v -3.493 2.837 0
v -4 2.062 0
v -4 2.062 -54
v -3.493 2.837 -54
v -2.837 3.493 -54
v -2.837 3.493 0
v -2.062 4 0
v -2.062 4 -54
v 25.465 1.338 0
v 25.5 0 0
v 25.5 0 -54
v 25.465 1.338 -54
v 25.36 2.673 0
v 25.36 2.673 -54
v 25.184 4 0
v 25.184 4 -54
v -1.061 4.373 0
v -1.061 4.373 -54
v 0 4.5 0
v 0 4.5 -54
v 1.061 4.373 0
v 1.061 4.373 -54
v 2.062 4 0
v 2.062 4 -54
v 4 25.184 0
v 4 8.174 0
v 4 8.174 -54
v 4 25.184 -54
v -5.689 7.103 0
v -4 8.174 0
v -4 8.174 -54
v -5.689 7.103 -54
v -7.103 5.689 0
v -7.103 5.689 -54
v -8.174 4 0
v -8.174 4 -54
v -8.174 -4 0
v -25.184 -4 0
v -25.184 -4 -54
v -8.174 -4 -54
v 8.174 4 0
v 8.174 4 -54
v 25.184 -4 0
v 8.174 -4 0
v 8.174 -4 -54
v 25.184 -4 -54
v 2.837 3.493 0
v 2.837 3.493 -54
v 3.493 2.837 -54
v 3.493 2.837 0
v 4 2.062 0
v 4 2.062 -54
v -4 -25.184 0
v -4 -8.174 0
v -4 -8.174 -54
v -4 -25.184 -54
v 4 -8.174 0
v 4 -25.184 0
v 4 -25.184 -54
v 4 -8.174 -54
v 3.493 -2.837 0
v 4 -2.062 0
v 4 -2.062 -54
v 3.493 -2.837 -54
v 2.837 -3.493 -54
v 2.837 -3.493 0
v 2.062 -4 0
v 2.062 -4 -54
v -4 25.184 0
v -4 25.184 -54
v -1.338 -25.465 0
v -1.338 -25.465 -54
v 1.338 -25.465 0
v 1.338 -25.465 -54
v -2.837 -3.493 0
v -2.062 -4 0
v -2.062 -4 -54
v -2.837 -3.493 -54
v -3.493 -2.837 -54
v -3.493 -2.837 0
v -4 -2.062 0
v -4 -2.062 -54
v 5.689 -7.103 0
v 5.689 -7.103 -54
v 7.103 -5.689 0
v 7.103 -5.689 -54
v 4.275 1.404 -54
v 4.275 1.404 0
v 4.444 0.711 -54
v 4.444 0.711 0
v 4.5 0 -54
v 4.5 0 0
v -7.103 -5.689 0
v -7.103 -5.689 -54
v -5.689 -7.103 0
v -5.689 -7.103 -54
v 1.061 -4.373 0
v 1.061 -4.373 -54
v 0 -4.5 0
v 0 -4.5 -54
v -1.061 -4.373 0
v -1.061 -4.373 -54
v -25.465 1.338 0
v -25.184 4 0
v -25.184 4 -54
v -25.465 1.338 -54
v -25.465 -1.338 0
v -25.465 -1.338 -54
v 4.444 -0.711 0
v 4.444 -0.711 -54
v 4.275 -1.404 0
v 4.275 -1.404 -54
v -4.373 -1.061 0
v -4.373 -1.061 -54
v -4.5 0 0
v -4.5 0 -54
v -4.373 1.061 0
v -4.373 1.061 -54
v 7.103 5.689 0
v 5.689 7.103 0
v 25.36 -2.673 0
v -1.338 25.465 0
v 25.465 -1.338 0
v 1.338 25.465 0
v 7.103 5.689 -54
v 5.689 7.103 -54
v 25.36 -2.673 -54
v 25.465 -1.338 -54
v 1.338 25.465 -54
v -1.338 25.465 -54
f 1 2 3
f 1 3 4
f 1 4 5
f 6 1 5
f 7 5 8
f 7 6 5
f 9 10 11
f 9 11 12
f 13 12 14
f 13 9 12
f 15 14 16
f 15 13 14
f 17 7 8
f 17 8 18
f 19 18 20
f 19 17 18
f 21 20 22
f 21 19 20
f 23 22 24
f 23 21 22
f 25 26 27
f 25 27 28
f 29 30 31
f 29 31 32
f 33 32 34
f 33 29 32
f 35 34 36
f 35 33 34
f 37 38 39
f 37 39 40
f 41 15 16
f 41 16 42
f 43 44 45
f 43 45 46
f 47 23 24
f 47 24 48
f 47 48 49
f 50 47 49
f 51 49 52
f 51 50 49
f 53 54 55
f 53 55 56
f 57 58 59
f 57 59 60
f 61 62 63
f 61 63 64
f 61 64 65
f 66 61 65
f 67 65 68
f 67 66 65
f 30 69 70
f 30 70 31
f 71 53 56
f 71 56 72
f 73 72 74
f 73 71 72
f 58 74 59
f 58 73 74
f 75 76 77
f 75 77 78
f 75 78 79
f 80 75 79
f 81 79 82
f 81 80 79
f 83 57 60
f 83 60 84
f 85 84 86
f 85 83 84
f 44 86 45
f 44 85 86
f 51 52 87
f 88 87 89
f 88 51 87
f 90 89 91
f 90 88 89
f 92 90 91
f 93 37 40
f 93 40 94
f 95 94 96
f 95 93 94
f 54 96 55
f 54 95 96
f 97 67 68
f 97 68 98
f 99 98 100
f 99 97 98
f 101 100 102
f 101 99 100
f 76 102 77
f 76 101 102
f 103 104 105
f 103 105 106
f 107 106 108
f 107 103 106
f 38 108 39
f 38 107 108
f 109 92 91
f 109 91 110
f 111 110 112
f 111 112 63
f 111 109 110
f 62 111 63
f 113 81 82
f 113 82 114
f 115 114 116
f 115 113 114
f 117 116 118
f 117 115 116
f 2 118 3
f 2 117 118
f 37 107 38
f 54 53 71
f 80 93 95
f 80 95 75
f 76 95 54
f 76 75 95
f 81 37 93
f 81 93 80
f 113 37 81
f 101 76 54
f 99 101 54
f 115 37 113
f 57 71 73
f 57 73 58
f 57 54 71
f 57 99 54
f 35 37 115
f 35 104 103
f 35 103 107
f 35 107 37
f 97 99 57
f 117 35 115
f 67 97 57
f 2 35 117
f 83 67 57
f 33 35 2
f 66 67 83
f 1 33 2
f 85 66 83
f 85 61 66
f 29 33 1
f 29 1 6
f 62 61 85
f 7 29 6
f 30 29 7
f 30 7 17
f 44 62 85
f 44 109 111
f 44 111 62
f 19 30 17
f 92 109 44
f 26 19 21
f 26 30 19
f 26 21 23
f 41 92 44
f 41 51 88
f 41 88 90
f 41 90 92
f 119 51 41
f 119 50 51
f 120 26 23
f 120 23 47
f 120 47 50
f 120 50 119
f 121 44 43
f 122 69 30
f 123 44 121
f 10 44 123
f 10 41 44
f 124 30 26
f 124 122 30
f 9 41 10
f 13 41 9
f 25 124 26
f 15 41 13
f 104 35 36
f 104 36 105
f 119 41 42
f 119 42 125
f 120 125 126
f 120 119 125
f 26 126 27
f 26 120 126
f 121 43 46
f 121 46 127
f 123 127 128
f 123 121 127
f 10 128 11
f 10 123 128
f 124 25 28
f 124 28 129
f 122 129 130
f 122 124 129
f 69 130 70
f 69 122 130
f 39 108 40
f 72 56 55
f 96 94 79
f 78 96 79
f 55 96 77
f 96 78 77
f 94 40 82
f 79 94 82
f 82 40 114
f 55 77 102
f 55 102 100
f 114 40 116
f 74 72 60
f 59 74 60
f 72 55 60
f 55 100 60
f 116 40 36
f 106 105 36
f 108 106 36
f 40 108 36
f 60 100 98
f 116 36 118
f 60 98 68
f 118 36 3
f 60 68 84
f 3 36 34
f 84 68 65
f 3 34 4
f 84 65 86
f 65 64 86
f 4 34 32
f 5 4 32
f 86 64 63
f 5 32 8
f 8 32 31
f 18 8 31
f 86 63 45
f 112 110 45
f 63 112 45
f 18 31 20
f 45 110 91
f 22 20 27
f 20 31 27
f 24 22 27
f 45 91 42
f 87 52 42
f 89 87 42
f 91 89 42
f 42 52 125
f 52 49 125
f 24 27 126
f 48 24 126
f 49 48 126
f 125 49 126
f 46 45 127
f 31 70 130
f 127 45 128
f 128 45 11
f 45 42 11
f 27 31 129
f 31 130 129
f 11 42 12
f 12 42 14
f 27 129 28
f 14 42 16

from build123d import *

# Parameters (mm, degrees)
F1_DEPTH = 54


with BuildPart() as f1:
    # F0 (on Top) → F1 (new body)
    with BuildSketch(Plane.XY):
        with BuildLine():
            ThreePointArc((-4, 12.4743737318), (0, 13.1), (4, 12.4743737318))
            Line((4, 12.4743737318), (4, 25.1843205189))
            Line((4, 25.1843205189), (-4, 25.1843205189))
            Line((-4, 25.1843205189), (-4, 12.4743737318))
        make_face()
        with BuildLine():
            Line((-4, 25.1843205189), (4, 25.1843205189))
            ThreePointArc((4, 25.1843205189), (0, 25.5), (-4, 25.1843205189))
        make_face()
        with BuildLine():
            ThreePointArc((25.5, 0), (25.4209576259, 2.0062186779), (25.1843205189, 4))
            Line((25.1843205189, 4), (25.1843205189, -4))
            ThreePointArc((25.1843205189, -4), (25.4209576259, -2.0062186779), (25.5, 0))
        make_face()
        with BuildLine():
            Line((25.1843205189, 4), (12.4743737318, 4))
            ThreePointArc((12.4743737318, 4), (12.942648413, 2.0243152069), (13.1, 0))
            ThreePointArc((13.1, 0), (12.942648413, -2.0243152069), (12.4743737318, -4))
            Line((12.4743737318, -4), (25.1843205189, -4))
            Line((25.1843205189, -4), (25.1843205189, 4))
        make_face()
        with BuildLine():
            ThreePointArc((-4, -25.1843205189), (0, -25.5), (4, -25.1843205189))
            Line((4, -25.1843205189), (-4, -25.1843205189))
        make_face()
        with BuildLine():
            Line((-25.1843205189, -4), (-25.1843205189, 4))
            ThreePointArc((-25.1843205189, 4), (-25.5, 0), (-25.1843205189, -4))
        make_face()
        with BuildLine():
            ThreePointArc((-12.4743737318, -4), (-13.1, 0), (-12.4743737318, 4))
            Line((-12.4743737318, 4), (-25.1843205189, 4))
            Line((-25.1843205189, 4), (-25.1843205189, -4))
            Line((-25.1843205189, -4), (-12.4743737318, -4))
        make_face()
        with BuildLine():
            Line((4, -25.1843205189), (4, -12.4743737318))
            ThreePointArc((4, -12.4743737318), (0, -13.1), (-4, -12.4743737318))
            Line((-4, -12.4743737318), (-4, -25.1843205189))
            Line((-4, -25.1843205189), (4, -25.1843205189))
        make_face()
        with BuildLine():
            Line((-8.1737384348, 4), (-10.3542261903, 4))
            ThreePointArc((-10.3542261903, 4), (-11.1, 0), (-10.3542261903, -4))
            Line((-10.3542261903, -4), (-8.1737384348, -4))
            ThreePointArc((-8.1737384348, -4), (-9.1, 0), (-8.1737384348, 4))
        make_face()
        with BuildLine():
            ThreePointArc((-10.3542261903, -4), (-11.1, 0), (-10.3542261903, 4))
            Line((-10.3542261903, 4), (-12.4743737318, 4))
            ThreePointArc((-12.4743737318, 4), (-13.1, 0), (-12.4743737318, -4))
            Line((-12.4743737318, -4), (-10.3542261903, -4))
        make_face()
        with BuildLine():
            Line((4, 8.1737384348), (4, 10.3542261903))
            ThreePointArc((4, 10.3542261903), (0, 11.1), (-4, 10.3542261903))
            Line((-4, 10.3542261903), (-4, 8.1737384348))
            ThreePointArc((-4, 8.1737384348), (0, 9.1), (4, 8.1737384348))
        make_face()
        with BuildLine():
            ThreePointArc((-4, 10.3542261903), (0, 11.1), (4, 10.3542261903))
            Line((4, 10.3542261903), (4, 12.4743737318))
            ThreePointArc((4, 12.4743737318), (0, 13.1), (-4, 12.4743737318))
            Line((-4, 12.4743737318), (-4, 10.3542261903))
        make_face()
        with BuildLine():
            ThreePointArc((10.3542261903, 4), (10.9119638634, 2.0344642154), (11.1, 0))
            ThreePointArc((11.1, 0), (10.9119638634, -2.0344642154), (10.3542261903, -4))
            Line((10.3542261903, -4), (12.4743737318, -4))
            ThreePointArc((12.4743737318, -4), (12.942648413, -2.0243152069), (13.1, 0))
            ThreePointArc((13.1, 0), (12.942648413, 2.0243152069), (12.4743737318, 4))
            Line((12.4743737318, 4), (10.3542261903, 4))
        make_face()
        with BuildLine():
            ThreePointArc((10.3542261903, -4), (10.9119638634, -2.0344642154), (11.1, 0))
            ThreePointArc((11.1, 0), (10.9119638634, 2.0344642154), (10.3542261903, 4))
            Line((10.3542261903, 4), (8.1737384348, 4))
            ThreePointArc((8.1737384348, 4), (8.8654108691, 2.052922337), (9.1, 0))
            ThreePointArc((9.1, 0), (8.8654108691, -2.052922337), (8.1737384348, -4))
            Line((8.1737384348, -4), (10.3542261903, -4))
        make_face()
        with BuildLine():
            ThreePointArc((-4, -10.3542261903), (0, -11.1), (4, -10.3542261903))
            Line((4, -10.3542261903), (4, -8.1737384348))
            ThreePointArc((4, -8.1737384348), (0, -9.1), (-4, -8.1737384348))
            Line((-4, -8.1737384348), (-4, -10.3542261903))
        make_face()
        with BuildLine():
            Line((4, -12.4743737318), (4, -10.3542261903))
            ThreePointArc((4, -10.3542261903), (0, -11.1), (-4, -10.3542261903))
            Line((-4, -10.3542261903), (-4, -12.4743737318))
            ThreePointArc((-4, -12.4743737318), (0, -13.1), (4, -12.4743737318))
        make_face()
        with BuildLine():
            Line((-4, 4), (-8.1737384348, 4))
            ThreePointArc((-8.1737384348, 4), (-9.1, 0), (-8.1737384348, -4))
            Line((-8.1737384348, -4), (-4, -4))
            Line((-4, -4), (-4, -2.0615528128))
            ThreePointArc((-4, -2.0615528128), (-4.5, 0), (-4, 2.0615528128))
            Line((-4, 2.0615528128), (-4, 4))
        make_face()
        with BuildLine():
            Line((-4, 4), (-4, 8.1737384348))
            ThreePointArc((-4, 8.1737384348), (-6.4346717088, 6.4346717088), (-8.1737384348, 4))
            Line((-8.1737384348, 4), (-4, 4))
        make_face()
        with BuildLine():
            Line((4, 4), (4, 8.1737384348))
            ThreePointArc((4, 8.1737384348), (0, 9.1), (-4, 8.1737384348))
            Line((-4, 8.1737384348), (-4, 4))
            Line((-4, 4), (-2.0615528128, 4))
            ThreePointArc((-2.0615528128, 4), (0, 4.5), (2.0615528128, 4))
            Line((2.0615528128, 4), (4, 4))
        make_face()
        with BuildLine():
            Line((4, 4), (8.1737384348, 4))
            ThreePointArc((8.1737384348, 4), (6.4346717088, 6.4346717088), (4, 8.1737384348))
            Line((4, 8.1737384348), (4, 4))
        make_face()
        with BuildLine():
            ThreePointArc((9.1, 0), (8.8654108691, 2.052922337), (8.1737384348, 4))
            Line((8.1737384348, 4), (4, 4))
            Line((4, 4), (4, 2.0615528128))
            ThreePointArc((4, 2.0615528128), (4.3732139211, 1.0606601718), (4.5, 0))
            ThreePointArc((4.5, 0), (4.3732139211, -1.0606601718), (4, -2.0615528128))
            Line((4, -2.0615528128), (4, -4))
            Line((4, -4), (8.1737384348, -4))
            ThreePointArc((8.1737384348, -4), (8.8654108691, -2.052922337), (9.1, 0))
        make_face()
        with BuildLine():
            ThreePointArc((-4, -8.1737384348), (0, -9.1), (4, -8.1737384348))
            Line((4, -8.1737384348), (4, -4))
            Line((4, -4), (2.0615528128, -4))
            ThreePointArc((2.0615528128, -4), (0, -4.5), (-2.0615528128, -4))
            Line((-2.0615528128, -4), (-4, -4))
            Line((-4, -4), (-4, -8.1737384348))
        make_face()
        with BuildLine():
            ThreePointArc((-8.1737384348, -4), (-6.4346717088, -6.4346717088), (-4, -8.1737384348))
            Line((-4, -8.1737384348), (-4, -4))
            Line((-4, -4), (-8.1737384348, -4))
        make_face()
        with BuildLine():
            ThreePointArc((4, -8.1737384348), (6.4346717088, -6.4346717088), (8.1737384348, -4))
            Line((8.1737384348, -4), (4, -4))
            Line((4, -4), (4, -8.1737384348))
        make_face()
        with BuildLine():
            Line((2.0615528128, -4), (4, -4))
            Line((4, -4), (4, -2.0615528128))
            ThreePointArc((4, -2.0615528128), (3.1819805153, -3.1819805153), (2.0615528128, -4))
        make_face()
        with BuildLine():
            Line((-4, -2.0615528128), (-4, -4))
            Line((-4, -4), (-2.0615528128, -4))
            ThreePointArc((-2.0615528128, -4), (-3.1819805153, -3.1819805153), (-4, -2.0615528128))
        make_face()
        with BuildLine():
            Line((-2.0615528128, 4), (-4, 4))
            Line((-4, 4), (-4, 2.0615528128))
            ThreePointArc((-4, 2.0615528128), (-3.1819805153, 3.1819805153), (-2.0615528128, 4))
        make_face()
        with BuildLine():
            Line((4, 2.0615528128), (4, 4))
            Line((4, 4), (2.0615528128, 4))
            ThreePointArc((2.0615528128, 4), (3.1819805153, 3.1819805153), (4, 2.0615528128))
        make_face()
    extrude(amount=-F1_DEPTH)


solid = f1.part
